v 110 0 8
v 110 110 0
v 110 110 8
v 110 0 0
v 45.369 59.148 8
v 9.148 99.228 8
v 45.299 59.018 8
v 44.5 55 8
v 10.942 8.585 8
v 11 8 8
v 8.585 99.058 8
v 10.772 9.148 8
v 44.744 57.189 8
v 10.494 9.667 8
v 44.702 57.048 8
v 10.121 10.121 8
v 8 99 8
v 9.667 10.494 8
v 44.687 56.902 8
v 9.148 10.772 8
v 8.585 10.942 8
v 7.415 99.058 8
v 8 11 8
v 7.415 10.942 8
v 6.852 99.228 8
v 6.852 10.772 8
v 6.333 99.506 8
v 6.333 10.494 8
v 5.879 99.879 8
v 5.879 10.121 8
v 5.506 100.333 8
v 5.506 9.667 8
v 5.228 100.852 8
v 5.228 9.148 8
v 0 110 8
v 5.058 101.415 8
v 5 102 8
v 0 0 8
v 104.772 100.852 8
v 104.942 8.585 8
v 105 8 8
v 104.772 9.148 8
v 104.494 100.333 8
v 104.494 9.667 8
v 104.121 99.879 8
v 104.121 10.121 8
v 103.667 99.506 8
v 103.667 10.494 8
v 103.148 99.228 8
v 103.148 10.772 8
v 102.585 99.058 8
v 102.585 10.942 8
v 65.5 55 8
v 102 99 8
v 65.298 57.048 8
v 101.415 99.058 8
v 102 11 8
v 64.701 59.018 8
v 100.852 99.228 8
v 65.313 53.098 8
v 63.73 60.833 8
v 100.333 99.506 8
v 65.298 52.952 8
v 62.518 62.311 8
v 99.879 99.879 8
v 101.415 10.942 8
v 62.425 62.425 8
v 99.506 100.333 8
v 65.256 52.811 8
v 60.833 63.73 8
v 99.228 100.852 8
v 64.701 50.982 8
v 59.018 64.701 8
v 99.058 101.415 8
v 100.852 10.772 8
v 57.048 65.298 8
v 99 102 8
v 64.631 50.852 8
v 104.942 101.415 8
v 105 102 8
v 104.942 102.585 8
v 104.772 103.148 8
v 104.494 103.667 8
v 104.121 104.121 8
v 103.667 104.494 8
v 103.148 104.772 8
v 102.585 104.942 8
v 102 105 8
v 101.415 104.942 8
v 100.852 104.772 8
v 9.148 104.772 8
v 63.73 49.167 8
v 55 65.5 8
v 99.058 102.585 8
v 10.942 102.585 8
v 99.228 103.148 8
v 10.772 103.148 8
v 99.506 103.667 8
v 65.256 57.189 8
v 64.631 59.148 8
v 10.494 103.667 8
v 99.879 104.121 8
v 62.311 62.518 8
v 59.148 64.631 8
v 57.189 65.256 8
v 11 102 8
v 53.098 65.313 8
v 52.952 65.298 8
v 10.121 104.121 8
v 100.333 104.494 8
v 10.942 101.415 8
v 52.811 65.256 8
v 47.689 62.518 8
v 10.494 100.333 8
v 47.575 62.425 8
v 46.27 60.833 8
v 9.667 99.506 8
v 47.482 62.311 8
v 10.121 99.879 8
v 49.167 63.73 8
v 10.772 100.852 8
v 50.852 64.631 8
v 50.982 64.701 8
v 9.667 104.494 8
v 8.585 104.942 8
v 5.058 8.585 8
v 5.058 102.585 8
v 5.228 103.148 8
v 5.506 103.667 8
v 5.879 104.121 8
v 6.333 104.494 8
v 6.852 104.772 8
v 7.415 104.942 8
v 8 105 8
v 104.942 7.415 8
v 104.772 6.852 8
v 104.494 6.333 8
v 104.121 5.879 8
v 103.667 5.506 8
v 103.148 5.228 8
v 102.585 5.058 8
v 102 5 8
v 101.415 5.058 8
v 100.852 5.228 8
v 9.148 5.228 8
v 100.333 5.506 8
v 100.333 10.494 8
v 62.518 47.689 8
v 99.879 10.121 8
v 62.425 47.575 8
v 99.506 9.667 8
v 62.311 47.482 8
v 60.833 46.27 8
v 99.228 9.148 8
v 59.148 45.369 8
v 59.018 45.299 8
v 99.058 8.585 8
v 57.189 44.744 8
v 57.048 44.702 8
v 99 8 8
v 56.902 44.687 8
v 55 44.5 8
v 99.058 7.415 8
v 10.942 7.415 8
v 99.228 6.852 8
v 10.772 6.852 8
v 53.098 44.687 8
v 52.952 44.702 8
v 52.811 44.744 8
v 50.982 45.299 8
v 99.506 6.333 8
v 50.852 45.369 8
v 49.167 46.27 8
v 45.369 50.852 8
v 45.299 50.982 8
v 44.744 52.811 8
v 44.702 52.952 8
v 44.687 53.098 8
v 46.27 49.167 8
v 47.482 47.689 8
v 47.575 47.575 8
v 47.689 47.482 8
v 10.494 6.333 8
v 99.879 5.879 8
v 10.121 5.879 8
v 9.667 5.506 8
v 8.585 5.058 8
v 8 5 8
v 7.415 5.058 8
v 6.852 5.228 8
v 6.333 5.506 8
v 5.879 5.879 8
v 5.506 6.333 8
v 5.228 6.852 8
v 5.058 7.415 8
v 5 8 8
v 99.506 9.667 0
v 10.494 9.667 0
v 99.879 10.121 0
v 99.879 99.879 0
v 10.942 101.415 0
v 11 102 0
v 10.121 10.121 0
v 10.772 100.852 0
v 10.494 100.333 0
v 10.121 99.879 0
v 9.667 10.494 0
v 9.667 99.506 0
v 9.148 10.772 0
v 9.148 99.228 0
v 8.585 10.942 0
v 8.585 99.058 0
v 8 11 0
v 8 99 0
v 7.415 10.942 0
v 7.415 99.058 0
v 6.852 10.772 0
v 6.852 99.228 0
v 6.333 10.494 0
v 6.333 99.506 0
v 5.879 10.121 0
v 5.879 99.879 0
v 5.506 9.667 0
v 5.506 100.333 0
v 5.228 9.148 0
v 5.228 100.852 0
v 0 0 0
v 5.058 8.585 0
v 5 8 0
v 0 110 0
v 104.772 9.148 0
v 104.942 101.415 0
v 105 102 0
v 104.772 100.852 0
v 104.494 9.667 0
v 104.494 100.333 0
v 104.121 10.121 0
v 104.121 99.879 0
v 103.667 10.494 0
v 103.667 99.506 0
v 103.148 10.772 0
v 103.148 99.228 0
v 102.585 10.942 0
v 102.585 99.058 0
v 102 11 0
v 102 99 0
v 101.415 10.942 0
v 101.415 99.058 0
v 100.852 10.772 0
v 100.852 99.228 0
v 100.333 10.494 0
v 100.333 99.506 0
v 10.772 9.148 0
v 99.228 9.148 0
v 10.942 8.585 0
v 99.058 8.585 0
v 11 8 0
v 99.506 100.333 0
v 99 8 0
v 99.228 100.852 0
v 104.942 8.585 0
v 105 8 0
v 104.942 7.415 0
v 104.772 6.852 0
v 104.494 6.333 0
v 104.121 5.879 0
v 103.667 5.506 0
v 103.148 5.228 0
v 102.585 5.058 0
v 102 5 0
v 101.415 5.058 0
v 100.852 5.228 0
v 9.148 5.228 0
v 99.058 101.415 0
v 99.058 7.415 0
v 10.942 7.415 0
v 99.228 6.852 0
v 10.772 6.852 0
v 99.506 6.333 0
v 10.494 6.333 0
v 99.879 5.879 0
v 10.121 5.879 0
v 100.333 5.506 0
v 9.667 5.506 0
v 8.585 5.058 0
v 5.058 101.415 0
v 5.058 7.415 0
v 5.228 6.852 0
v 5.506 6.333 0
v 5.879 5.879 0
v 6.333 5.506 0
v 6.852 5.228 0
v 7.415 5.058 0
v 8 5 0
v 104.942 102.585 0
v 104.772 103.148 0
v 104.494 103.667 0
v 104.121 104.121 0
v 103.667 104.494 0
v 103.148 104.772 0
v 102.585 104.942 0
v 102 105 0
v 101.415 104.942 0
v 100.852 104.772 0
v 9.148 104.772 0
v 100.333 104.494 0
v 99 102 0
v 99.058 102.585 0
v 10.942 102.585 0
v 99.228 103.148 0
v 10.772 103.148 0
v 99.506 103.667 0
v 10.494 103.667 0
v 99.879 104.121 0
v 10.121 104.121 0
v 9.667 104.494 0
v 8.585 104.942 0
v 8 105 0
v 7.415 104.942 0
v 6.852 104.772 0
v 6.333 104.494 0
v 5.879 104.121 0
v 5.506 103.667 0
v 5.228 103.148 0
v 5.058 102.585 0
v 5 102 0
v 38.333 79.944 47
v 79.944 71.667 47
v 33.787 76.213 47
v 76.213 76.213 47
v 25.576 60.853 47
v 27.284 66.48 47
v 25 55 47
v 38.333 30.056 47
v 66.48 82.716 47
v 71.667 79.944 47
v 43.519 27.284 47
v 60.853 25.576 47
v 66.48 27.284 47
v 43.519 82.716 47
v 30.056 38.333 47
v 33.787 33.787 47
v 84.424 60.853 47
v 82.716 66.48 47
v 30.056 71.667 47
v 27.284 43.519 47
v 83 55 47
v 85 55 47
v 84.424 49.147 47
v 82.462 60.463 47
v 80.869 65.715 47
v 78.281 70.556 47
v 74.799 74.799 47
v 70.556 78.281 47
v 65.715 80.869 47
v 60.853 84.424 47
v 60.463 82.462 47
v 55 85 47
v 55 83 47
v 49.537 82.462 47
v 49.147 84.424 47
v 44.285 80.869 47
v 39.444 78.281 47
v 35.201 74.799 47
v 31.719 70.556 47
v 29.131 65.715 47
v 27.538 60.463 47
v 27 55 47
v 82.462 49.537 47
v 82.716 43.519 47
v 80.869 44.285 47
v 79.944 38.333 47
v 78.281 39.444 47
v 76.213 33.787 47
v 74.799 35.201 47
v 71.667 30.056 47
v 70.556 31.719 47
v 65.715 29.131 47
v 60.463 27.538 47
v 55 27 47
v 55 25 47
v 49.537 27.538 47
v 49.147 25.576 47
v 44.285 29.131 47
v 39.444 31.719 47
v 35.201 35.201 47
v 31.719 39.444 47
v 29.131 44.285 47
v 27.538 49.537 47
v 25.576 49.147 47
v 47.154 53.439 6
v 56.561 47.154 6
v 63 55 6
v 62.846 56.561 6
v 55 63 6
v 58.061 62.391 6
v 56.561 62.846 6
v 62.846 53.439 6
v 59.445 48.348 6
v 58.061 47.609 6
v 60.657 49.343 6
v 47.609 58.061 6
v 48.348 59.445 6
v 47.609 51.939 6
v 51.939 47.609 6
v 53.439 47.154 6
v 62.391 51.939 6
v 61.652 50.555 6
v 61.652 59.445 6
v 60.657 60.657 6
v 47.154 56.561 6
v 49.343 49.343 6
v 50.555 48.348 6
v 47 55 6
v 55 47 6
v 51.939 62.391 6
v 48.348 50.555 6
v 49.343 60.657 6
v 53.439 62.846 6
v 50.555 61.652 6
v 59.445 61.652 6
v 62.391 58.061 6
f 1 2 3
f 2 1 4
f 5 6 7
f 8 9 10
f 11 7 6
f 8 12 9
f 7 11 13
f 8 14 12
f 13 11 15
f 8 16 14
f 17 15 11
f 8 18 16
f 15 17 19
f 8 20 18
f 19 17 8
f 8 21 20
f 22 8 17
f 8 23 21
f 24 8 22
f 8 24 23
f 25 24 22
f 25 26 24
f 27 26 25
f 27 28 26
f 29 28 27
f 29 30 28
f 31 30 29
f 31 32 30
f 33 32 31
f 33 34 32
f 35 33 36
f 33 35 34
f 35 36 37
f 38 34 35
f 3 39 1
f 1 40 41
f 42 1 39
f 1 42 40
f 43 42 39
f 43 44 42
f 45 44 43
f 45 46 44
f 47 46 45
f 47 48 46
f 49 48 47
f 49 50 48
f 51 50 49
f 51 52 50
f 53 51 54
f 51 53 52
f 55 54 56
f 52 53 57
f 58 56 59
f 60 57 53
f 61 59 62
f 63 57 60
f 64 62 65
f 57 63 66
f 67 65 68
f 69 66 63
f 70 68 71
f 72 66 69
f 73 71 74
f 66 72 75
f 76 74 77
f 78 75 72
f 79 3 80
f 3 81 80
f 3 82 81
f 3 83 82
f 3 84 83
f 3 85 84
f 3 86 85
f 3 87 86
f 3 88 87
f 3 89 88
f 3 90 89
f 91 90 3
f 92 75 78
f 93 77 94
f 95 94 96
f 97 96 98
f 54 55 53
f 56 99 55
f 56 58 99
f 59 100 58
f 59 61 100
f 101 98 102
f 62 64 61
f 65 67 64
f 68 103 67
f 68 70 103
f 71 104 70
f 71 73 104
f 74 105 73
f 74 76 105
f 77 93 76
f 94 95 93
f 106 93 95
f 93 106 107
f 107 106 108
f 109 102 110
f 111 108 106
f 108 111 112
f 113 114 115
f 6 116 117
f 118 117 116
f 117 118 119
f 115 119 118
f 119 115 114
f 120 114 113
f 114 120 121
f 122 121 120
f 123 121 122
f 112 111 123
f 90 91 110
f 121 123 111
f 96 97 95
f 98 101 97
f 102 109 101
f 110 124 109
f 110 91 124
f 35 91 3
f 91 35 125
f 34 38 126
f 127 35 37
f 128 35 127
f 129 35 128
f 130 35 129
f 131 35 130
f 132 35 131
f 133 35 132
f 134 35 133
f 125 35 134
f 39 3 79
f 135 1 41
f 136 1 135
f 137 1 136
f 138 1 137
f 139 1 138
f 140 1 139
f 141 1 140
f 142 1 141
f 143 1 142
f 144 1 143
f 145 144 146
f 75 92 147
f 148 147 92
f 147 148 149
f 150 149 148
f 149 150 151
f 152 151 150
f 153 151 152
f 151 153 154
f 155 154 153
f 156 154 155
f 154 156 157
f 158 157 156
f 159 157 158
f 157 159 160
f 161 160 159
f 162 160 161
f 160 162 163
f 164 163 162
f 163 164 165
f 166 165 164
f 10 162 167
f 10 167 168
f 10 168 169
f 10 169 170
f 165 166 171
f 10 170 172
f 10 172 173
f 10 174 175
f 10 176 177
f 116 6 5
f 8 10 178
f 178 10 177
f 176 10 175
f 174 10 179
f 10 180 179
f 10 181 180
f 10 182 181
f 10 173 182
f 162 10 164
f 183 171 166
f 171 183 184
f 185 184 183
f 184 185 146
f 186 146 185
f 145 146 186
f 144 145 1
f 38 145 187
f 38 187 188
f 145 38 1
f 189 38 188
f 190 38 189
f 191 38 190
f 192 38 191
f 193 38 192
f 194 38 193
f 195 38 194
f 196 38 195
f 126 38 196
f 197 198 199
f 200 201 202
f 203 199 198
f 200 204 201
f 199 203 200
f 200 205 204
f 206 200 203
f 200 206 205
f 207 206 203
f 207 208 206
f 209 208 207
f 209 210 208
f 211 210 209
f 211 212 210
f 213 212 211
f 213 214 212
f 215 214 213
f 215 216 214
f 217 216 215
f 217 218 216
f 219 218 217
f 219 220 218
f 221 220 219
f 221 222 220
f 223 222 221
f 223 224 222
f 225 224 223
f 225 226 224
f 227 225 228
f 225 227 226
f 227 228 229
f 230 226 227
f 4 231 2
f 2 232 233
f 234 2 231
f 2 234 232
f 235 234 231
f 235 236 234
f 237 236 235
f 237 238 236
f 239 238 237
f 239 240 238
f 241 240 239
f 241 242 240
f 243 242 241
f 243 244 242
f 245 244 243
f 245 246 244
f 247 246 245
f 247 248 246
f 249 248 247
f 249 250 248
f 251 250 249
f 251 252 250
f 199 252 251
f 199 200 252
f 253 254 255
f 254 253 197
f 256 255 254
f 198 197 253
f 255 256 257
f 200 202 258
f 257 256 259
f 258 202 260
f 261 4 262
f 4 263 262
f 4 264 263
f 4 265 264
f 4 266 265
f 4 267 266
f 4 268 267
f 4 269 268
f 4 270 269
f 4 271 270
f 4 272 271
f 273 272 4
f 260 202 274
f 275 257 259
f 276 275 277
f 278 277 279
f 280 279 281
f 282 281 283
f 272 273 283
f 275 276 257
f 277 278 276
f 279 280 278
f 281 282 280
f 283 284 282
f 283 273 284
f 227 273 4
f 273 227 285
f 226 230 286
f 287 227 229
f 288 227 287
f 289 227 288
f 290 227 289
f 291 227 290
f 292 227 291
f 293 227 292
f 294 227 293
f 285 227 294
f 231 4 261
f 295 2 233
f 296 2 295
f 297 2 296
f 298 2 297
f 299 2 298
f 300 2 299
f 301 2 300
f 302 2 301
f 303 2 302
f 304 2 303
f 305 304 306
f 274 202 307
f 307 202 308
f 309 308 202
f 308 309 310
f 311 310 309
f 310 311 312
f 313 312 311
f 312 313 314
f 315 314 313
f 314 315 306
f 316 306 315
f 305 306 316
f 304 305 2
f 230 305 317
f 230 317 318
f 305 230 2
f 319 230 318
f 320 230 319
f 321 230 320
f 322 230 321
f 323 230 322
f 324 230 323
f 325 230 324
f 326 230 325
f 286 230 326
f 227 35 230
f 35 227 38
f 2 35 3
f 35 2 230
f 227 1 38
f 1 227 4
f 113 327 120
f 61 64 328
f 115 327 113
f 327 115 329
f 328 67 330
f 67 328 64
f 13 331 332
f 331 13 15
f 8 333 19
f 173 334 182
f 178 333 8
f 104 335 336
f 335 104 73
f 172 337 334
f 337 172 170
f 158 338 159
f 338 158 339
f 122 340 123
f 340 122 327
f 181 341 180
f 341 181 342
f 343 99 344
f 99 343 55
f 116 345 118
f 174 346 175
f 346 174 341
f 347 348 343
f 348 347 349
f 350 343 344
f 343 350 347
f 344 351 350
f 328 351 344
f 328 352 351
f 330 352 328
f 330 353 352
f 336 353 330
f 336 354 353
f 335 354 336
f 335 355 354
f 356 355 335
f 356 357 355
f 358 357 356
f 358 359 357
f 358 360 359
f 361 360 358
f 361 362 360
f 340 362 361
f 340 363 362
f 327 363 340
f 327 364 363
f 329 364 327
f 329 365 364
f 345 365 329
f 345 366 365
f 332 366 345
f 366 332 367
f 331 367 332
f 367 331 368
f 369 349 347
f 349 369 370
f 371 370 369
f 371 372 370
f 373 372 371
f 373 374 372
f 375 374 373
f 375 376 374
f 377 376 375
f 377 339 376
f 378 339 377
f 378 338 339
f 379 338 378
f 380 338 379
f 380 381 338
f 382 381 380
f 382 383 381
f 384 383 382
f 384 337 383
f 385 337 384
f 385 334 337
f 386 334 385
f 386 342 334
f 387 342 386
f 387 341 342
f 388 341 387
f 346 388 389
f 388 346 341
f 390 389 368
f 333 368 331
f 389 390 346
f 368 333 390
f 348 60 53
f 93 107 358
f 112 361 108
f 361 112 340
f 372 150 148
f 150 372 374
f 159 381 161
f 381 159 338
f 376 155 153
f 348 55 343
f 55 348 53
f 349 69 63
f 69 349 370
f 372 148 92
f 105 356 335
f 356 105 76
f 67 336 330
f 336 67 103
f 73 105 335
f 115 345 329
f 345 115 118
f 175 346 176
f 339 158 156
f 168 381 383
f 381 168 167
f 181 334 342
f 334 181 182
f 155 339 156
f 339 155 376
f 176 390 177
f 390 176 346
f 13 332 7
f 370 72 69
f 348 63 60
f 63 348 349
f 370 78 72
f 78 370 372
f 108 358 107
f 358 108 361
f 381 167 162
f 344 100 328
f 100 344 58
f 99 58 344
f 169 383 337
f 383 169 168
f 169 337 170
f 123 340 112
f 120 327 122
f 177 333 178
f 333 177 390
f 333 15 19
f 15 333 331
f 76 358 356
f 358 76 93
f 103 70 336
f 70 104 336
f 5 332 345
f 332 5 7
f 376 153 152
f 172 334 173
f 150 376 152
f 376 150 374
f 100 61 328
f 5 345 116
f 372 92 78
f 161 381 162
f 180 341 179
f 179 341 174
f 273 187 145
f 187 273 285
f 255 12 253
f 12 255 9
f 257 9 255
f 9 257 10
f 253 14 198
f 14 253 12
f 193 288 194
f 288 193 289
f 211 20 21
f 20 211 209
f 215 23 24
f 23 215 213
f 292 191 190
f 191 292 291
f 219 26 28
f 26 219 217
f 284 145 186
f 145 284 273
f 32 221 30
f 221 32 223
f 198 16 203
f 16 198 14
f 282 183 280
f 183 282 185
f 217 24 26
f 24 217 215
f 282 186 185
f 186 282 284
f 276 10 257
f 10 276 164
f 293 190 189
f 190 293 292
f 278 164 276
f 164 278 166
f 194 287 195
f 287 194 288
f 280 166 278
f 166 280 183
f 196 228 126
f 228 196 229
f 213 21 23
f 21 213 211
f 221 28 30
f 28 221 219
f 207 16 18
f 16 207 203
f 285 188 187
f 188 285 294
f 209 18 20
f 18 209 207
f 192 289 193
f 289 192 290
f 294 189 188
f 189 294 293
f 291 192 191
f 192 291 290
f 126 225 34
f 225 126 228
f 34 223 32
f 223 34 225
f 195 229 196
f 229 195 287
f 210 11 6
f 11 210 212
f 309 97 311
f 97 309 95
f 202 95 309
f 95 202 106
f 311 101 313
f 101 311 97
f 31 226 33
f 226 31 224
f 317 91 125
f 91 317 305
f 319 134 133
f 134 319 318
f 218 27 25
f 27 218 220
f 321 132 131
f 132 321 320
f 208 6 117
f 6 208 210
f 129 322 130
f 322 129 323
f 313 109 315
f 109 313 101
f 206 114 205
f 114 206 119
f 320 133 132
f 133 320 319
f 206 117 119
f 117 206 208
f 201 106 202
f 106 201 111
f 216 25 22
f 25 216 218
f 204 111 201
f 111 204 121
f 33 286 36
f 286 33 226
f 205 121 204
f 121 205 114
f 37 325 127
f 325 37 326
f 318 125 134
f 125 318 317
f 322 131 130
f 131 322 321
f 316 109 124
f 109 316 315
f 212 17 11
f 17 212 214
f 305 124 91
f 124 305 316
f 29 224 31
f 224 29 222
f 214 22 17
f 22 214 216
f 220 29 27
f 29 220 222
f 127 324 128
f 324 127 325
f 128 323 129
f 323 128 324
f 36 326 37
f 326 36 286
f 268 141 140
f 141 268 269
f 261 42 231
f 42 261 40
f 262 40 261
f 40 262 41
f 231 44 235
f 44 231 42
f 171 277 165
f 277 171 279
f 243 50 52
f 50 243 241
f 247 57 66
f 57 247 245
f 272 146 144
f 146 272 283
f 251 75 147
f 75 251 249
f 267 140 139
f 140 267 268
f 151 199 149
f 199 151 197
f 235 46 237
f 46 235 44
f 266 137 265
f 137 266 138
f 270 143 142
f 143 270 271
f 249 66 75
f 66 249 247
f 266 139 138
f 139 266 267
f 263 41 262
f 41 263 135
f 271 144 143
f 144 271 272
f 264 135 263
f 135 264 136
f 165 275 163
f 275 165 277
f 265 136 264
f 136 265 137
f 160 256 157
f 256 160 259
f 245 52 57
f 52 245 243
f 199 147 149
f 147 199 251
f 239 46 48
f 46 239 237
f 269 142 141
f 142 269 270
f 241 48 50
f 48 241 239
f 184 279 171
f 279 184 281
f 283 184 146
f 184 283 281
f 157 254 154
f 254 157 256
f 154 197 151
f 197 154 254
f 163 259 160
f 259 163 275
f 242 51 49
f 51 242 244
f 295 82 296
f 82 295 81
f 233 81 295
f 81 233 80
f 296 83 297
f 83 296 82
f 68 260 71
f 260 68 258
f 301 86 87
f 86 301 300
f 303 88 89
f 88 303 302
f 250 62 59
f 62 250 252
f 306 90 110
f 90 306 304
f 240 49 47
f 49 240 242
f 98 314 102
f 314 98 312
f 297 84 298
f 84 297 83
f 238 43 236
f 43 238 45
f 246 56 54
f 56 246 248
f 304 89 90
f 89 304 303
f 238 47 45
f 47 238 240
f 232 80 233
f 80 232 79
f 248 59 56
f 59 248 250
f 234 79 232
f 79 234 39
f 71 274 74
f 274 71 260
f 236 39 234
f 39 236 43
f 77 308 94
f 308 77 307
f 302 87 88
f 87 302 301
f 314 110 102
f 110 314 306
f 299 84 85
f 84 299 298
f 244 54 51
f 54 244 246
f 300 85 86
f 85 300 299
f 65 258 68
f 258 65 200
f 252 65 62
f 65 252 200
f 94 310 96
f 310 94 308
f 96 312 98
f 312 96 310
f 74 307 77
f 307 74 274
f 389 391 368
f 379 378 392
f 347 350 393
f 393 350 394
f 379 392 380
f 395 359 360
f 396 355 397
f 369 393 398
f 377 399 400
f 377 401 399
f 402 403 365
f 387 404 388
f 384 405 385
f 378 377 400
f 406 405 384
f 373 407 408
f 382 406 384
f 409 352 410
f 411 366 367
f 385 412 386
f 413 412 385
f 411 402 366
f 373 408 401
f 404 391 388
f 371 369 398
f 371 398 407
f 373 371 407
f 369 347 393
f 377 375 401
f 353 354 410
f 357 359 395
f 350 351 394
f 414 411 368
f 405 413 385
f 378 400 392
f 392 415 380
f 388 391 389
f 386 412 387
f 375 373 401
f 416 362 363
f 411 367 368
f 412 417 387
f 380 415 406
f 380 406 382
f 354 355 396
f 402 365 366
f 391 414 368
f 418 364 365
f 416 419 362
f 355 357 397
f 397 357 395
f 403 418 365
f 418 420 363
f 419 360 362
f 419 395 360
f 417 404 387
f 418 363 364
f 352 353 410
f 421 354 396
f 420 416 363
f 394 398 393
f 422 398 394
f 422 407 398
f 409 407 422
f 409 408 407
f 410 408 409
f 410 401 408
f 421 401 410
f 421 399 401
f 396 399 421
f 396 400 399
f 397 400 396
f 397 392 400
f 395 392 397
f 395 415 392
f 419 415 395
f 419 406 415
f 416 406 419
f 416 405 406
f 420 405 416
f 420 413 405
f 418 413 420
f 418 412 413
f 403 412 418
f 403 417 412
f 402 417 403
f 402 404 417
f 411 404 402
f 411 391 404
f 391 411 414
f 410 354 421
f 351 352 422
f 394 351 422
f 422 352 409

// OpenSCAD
$fn = 32;

// ----------------------------------------------------------------------
// Hopper: flanged with square flange
// ----------------------------------------------------------------------

// --- parameters (mm) ---
fl = 110;                 // flange side, X and Y
fl_t = 8;                 // flange thickness
cone_h = 40;              // cone height above the flange
top_d = 60;               // cone mouth diameter
bot_d = 20;               // cone spout diameter
wall = 2;                 // cone wall thickness
hole_r = 3;               // flange hole radius
hole_in = 8;              // hole inset from the corners

bore_d = bot_d - 2 * wall;  // spout bore diameter
total_h = fl_t + cone_h - 1;  // overall height

difference() {
  union() {
    cube([fl, fl, fl_t]);
    translate([fl / 2, fl / 2, fl_t - 1])
      cylinder(h = cone_h, d1 = bot_d, d2 = top_d);
  }
  translate([fl / 2, fl / 2, fl_t - 2])
    cylinder(h = cone_h + 1, d1 = bore_d, d2 = top_d - 2 * wall);
  for (sx = [0, 1], sy = [0, 1])
    translate([sx ? fl - hole_in : hole_in,
               sy ? fl - hole_in : hole_in, -1])
      cylinder(r = hole_r, h = fl_t + 2);
}
